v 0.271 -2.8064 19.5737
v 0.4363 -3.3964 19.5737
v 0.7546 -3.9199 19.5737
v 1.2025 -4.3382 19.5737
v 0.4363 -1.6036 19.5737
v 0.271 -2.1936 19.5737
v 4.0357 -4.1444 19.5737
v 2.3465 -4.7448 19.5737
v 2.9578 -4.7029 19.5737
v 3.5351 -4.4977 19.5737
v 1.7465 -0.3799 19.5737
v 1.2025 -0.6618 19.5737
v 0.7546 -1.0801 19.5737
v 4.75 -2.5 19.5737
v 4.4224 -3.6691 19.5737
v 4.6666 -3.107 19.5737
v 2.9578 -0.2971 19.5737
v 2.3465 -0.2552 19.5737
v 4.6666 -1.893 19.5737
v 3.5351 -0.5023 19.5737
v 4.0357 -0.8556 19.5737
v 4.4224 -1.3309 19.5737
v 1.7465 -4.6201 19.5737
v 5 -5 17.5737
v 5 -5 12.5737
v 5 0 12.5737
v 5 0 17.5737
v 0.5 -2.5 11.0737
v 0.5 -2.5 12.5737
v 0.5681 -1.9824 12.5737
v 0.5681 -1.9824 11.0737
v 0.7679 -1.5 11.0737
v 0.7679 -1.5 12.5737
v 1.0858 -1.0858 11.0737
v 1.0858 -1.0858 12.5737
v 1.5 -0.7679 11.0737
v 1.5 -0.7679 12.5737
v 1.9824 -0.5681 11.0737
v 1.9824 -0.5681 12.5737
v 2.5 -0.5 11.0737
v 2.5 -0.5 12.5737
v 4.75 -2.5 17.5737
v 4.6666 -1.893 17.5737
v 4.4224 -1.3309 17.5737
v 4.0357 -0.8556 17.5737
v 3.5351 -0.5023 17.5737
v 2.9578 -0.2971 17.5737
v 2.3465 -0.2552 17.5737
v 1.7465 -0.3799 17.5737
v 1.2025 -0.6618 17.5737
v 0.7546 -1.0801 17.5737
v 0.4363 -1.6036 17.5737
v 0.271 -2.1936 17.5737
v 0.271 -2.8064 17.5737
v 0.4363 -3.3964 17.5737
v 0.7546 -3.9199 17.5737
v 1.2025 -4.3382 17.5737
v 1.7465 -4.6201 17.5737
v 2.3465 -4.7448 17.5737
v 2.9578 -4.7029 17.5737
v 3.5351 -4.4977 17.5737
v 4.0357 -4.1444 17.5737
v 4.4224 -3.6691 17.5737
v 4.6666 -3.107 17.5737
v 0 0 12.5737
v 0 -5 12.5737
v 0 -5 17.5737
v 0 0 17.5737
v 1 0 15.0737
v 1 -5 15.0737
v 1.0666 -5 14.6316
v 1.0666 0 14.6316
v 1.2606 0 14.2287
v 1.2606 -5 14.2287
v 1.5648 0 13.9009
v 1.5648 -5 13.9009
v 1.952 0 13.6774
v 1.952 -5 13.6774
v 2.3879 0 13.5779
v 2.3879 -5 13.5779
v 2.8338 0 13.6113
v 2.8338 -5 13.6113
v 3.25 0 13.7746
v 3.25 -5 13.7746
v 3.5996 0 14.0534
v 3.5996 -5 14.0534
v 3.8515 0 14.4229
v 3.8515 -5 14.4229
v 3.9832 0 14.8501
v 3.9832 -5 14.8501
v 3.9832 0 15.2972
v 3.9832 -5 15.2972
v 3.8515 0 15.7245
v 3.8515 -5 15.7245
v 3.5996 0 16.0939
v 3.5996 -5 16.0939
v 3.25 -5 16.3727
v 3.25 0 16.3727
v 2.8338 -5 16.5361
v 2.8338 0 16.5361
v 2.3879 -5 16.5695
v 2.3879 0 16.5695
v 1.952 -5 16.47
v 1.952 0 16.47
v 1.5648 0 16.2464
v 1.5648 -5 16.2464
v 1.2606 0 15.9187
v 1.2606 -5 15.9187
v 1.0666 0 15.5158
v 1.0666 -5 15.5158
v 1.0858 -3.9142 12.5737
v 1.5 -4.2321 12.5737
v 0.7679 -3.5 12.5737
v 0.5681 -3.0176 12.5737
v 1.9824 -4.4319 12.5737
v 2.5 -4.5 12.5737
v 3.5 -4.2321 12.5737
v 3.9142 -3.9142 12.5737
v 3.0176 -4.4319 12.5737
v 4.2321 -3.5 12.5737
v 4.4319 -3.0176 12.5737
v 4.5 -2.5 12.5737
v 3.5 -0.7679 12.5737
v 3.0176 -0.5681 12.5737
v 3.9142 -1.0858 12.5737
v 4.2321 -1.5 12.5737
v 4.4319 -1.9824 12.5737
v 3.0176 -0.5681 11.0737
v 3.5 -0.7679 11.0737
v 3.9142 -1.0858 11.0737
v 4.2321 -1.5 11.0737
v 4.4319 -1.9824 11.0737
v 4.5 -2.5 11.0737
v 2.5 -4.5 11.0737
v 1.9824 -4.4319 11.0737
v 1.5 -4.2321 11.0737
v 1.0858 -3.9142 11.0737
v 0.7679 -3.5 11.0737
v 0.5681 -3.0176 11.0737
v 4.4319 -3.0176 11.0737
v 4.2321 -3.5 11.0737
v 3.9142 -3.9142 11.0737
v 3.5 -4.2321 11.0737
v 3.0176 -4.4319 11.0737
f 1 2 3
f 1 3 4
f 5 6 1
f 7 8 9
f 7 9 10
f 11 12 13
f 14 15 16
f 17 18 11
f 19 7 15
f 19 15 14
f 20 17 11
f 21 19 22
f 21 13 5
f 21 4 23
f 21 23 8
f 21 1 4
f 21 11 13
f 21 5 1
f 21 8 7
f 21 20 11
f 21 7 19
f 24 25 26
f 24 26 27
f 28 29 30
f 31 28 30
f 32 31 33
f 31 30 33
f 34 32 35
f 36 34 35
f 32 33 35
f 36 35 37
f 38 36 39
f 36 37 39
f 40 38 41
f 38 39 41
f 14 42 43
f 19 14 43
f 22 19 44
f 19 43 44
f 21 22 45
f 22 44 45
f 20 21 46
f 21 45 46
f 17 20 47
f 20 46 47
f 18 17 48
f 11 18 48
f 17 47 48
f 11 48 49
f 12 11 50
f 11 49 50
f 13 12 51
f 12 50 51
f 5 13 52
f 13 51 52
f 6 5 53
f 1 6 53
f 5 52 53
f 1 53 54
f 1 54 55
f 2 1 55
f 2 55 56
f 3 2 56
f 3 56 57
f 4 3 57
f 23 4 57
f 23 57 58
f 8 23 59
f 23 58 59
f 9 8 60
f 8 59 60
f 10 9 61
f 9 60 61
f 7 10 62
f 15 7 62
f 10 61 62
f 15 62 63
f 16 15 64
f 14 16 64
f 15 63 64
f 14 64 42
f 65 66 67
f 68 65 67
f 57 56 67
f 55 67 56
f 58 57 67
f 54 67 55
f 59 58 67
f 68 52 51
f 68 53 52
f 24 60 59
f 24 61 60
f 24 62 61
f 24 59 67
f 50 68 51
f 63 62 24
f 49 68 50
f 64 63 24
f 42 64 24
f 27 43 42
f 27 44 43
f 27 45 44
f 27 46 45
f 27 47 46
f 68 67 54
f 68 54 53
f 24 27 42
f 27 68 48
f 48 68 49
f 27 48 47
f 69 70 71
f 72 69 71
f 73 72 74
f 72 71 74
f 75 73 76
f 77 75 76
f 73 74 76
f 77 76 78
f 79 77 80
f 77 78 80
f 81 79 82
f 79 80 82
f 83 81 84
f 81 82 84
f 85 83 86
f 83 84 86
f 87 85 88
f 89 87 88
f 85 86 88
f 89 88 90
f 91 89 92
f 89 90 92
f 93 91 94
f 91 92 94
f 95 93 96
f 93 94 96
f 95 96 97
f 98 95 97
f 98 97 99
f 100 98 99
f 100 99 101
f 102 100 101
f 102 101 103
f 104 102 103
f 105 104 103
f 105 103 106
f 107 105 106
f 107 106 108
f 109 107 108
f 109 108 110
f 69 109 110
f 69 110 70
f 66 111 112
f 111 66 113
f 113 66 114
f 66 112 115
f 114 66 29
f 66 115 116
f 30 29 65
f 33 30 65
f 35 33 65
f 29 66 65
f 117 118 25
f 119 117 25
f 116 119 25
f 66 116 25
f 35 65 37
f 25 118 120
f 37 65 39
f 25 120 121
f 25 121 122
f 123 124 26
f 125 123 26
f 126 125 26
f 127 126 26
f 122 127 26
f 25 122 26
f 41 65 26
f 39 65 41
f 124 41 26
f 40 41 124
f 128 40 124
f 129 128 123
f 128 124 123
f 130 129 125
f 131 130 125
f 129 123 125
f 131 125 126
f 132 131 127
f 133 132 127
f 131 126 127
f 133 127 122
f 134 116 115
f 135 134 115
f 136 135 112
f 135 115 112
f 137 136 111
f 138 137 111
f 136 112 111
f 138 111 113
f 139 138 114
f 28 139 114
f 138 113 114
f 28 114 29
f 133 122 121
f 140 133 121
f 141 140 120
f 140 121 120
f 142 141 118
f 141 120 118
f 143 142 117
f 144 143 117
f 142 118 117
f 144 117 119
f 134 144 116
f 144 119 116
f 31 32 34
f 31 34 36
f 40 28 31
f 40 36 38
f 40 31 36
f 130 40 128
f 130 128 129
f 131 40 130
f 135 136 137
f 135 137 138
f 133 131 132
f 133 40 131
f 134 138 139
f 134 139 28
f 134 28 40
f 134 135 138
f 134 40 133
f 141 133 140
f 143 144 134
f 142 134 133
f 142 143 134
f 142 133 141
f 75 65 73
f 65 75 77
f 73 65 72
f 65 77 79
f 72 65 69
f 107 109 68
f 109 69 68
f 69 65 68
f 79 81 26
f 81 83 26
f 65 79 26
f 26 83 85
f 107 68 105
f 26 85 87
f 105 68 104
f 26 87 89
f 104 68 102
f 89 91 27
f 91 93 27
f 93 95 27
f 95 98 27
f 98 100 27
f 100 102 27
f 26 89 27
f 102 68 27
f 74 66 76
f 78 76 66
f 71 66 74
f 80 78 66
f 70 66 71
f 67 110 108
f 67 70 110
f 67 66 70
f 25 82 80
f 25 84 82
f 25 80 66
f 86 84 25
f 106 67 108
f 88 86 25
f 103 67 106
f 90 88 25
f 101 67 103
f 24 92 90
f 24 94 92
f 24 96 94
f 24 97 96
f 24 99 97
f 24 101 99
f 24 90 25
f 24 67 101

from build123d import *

# Parameters (mm, degrees)
F0_W     = 5
F0_H     = 5
F1_DEPTH = 5
F2_D     = 3
F3_R     = 2.25
F4_DEPTH = 2
F6_DEPTH = 1.5


with BuildPart() as f1:
    # F0 (on Front) → F1 (new body)
    with BuildSketch(Plane.XZ):
        with Locations((2.5, 15.0736845657)):
            Rectangle(F0_W, F0_H)
    extrude(amount=F1_DEPTH)

    # F2 (through all)
    with Locations(Plane(origin=(0, 0, 0), x_dir=(1, 0, 0), z_dir=(0, 1, 0))):
        with Locations((2.5, -15.0736845657)):
            Hole(F2_D / 2)

    # F3 (on face) → F4 (join)
    with BuildSketch(Plane.XY.offset(17.5736845657)):
        with Locations((2.5, -2.5)):
            Circle(F3_R)
    extrude(amount=F4_DEPTH)

    # F5 (on face) → F6 (join)
    with BuildSketch(Plane(origin=(0, 0, 12.5736845657), x_dir=(1, 0, 0), z_dir=(0, 0, -1))):
        with BuildLine():
            Line((2.5, 2.5), (2.5, 4.5))
            ThreePointArc((2.5, 4.5), (1.0857864376, 3.9142135624), (0.5, 2.5))
            Line((0.5, 2.5), (2.5, 2.5))
        make_face()
        with BuildLine():
            ThreePointArc((4.5, 2.5), (3.9142135624, 3.9142135624), (2.5, 4.5))
            Line((2.5, 4.5), (2.5, 2.5))
            Line((2.5, 2.5), (4.5, 2.5))
        make_face()
        with BuildLine():
            Line((4.5, 2.5), (2.5, 2.5))
            Line((2.5, 2.5), (2.5, 0.5))
            ThreePointArc((2.5, 0.5), (3.9142135624, 1.0857864376), (4.5, 2.5))
        make_face()
        with BuildLine():
            Line((2.5, 0.5), (2.5, 2.5))
            Line((2.5, 2.5), (0.5, 2.5))
            ThreePointArc((0.5, 2.5), (1.0857864376, 1.0857864376), (2.5, 0.5))
        make_face()
    extrude(amount=F6_DEPTH)


solid = f1.part
